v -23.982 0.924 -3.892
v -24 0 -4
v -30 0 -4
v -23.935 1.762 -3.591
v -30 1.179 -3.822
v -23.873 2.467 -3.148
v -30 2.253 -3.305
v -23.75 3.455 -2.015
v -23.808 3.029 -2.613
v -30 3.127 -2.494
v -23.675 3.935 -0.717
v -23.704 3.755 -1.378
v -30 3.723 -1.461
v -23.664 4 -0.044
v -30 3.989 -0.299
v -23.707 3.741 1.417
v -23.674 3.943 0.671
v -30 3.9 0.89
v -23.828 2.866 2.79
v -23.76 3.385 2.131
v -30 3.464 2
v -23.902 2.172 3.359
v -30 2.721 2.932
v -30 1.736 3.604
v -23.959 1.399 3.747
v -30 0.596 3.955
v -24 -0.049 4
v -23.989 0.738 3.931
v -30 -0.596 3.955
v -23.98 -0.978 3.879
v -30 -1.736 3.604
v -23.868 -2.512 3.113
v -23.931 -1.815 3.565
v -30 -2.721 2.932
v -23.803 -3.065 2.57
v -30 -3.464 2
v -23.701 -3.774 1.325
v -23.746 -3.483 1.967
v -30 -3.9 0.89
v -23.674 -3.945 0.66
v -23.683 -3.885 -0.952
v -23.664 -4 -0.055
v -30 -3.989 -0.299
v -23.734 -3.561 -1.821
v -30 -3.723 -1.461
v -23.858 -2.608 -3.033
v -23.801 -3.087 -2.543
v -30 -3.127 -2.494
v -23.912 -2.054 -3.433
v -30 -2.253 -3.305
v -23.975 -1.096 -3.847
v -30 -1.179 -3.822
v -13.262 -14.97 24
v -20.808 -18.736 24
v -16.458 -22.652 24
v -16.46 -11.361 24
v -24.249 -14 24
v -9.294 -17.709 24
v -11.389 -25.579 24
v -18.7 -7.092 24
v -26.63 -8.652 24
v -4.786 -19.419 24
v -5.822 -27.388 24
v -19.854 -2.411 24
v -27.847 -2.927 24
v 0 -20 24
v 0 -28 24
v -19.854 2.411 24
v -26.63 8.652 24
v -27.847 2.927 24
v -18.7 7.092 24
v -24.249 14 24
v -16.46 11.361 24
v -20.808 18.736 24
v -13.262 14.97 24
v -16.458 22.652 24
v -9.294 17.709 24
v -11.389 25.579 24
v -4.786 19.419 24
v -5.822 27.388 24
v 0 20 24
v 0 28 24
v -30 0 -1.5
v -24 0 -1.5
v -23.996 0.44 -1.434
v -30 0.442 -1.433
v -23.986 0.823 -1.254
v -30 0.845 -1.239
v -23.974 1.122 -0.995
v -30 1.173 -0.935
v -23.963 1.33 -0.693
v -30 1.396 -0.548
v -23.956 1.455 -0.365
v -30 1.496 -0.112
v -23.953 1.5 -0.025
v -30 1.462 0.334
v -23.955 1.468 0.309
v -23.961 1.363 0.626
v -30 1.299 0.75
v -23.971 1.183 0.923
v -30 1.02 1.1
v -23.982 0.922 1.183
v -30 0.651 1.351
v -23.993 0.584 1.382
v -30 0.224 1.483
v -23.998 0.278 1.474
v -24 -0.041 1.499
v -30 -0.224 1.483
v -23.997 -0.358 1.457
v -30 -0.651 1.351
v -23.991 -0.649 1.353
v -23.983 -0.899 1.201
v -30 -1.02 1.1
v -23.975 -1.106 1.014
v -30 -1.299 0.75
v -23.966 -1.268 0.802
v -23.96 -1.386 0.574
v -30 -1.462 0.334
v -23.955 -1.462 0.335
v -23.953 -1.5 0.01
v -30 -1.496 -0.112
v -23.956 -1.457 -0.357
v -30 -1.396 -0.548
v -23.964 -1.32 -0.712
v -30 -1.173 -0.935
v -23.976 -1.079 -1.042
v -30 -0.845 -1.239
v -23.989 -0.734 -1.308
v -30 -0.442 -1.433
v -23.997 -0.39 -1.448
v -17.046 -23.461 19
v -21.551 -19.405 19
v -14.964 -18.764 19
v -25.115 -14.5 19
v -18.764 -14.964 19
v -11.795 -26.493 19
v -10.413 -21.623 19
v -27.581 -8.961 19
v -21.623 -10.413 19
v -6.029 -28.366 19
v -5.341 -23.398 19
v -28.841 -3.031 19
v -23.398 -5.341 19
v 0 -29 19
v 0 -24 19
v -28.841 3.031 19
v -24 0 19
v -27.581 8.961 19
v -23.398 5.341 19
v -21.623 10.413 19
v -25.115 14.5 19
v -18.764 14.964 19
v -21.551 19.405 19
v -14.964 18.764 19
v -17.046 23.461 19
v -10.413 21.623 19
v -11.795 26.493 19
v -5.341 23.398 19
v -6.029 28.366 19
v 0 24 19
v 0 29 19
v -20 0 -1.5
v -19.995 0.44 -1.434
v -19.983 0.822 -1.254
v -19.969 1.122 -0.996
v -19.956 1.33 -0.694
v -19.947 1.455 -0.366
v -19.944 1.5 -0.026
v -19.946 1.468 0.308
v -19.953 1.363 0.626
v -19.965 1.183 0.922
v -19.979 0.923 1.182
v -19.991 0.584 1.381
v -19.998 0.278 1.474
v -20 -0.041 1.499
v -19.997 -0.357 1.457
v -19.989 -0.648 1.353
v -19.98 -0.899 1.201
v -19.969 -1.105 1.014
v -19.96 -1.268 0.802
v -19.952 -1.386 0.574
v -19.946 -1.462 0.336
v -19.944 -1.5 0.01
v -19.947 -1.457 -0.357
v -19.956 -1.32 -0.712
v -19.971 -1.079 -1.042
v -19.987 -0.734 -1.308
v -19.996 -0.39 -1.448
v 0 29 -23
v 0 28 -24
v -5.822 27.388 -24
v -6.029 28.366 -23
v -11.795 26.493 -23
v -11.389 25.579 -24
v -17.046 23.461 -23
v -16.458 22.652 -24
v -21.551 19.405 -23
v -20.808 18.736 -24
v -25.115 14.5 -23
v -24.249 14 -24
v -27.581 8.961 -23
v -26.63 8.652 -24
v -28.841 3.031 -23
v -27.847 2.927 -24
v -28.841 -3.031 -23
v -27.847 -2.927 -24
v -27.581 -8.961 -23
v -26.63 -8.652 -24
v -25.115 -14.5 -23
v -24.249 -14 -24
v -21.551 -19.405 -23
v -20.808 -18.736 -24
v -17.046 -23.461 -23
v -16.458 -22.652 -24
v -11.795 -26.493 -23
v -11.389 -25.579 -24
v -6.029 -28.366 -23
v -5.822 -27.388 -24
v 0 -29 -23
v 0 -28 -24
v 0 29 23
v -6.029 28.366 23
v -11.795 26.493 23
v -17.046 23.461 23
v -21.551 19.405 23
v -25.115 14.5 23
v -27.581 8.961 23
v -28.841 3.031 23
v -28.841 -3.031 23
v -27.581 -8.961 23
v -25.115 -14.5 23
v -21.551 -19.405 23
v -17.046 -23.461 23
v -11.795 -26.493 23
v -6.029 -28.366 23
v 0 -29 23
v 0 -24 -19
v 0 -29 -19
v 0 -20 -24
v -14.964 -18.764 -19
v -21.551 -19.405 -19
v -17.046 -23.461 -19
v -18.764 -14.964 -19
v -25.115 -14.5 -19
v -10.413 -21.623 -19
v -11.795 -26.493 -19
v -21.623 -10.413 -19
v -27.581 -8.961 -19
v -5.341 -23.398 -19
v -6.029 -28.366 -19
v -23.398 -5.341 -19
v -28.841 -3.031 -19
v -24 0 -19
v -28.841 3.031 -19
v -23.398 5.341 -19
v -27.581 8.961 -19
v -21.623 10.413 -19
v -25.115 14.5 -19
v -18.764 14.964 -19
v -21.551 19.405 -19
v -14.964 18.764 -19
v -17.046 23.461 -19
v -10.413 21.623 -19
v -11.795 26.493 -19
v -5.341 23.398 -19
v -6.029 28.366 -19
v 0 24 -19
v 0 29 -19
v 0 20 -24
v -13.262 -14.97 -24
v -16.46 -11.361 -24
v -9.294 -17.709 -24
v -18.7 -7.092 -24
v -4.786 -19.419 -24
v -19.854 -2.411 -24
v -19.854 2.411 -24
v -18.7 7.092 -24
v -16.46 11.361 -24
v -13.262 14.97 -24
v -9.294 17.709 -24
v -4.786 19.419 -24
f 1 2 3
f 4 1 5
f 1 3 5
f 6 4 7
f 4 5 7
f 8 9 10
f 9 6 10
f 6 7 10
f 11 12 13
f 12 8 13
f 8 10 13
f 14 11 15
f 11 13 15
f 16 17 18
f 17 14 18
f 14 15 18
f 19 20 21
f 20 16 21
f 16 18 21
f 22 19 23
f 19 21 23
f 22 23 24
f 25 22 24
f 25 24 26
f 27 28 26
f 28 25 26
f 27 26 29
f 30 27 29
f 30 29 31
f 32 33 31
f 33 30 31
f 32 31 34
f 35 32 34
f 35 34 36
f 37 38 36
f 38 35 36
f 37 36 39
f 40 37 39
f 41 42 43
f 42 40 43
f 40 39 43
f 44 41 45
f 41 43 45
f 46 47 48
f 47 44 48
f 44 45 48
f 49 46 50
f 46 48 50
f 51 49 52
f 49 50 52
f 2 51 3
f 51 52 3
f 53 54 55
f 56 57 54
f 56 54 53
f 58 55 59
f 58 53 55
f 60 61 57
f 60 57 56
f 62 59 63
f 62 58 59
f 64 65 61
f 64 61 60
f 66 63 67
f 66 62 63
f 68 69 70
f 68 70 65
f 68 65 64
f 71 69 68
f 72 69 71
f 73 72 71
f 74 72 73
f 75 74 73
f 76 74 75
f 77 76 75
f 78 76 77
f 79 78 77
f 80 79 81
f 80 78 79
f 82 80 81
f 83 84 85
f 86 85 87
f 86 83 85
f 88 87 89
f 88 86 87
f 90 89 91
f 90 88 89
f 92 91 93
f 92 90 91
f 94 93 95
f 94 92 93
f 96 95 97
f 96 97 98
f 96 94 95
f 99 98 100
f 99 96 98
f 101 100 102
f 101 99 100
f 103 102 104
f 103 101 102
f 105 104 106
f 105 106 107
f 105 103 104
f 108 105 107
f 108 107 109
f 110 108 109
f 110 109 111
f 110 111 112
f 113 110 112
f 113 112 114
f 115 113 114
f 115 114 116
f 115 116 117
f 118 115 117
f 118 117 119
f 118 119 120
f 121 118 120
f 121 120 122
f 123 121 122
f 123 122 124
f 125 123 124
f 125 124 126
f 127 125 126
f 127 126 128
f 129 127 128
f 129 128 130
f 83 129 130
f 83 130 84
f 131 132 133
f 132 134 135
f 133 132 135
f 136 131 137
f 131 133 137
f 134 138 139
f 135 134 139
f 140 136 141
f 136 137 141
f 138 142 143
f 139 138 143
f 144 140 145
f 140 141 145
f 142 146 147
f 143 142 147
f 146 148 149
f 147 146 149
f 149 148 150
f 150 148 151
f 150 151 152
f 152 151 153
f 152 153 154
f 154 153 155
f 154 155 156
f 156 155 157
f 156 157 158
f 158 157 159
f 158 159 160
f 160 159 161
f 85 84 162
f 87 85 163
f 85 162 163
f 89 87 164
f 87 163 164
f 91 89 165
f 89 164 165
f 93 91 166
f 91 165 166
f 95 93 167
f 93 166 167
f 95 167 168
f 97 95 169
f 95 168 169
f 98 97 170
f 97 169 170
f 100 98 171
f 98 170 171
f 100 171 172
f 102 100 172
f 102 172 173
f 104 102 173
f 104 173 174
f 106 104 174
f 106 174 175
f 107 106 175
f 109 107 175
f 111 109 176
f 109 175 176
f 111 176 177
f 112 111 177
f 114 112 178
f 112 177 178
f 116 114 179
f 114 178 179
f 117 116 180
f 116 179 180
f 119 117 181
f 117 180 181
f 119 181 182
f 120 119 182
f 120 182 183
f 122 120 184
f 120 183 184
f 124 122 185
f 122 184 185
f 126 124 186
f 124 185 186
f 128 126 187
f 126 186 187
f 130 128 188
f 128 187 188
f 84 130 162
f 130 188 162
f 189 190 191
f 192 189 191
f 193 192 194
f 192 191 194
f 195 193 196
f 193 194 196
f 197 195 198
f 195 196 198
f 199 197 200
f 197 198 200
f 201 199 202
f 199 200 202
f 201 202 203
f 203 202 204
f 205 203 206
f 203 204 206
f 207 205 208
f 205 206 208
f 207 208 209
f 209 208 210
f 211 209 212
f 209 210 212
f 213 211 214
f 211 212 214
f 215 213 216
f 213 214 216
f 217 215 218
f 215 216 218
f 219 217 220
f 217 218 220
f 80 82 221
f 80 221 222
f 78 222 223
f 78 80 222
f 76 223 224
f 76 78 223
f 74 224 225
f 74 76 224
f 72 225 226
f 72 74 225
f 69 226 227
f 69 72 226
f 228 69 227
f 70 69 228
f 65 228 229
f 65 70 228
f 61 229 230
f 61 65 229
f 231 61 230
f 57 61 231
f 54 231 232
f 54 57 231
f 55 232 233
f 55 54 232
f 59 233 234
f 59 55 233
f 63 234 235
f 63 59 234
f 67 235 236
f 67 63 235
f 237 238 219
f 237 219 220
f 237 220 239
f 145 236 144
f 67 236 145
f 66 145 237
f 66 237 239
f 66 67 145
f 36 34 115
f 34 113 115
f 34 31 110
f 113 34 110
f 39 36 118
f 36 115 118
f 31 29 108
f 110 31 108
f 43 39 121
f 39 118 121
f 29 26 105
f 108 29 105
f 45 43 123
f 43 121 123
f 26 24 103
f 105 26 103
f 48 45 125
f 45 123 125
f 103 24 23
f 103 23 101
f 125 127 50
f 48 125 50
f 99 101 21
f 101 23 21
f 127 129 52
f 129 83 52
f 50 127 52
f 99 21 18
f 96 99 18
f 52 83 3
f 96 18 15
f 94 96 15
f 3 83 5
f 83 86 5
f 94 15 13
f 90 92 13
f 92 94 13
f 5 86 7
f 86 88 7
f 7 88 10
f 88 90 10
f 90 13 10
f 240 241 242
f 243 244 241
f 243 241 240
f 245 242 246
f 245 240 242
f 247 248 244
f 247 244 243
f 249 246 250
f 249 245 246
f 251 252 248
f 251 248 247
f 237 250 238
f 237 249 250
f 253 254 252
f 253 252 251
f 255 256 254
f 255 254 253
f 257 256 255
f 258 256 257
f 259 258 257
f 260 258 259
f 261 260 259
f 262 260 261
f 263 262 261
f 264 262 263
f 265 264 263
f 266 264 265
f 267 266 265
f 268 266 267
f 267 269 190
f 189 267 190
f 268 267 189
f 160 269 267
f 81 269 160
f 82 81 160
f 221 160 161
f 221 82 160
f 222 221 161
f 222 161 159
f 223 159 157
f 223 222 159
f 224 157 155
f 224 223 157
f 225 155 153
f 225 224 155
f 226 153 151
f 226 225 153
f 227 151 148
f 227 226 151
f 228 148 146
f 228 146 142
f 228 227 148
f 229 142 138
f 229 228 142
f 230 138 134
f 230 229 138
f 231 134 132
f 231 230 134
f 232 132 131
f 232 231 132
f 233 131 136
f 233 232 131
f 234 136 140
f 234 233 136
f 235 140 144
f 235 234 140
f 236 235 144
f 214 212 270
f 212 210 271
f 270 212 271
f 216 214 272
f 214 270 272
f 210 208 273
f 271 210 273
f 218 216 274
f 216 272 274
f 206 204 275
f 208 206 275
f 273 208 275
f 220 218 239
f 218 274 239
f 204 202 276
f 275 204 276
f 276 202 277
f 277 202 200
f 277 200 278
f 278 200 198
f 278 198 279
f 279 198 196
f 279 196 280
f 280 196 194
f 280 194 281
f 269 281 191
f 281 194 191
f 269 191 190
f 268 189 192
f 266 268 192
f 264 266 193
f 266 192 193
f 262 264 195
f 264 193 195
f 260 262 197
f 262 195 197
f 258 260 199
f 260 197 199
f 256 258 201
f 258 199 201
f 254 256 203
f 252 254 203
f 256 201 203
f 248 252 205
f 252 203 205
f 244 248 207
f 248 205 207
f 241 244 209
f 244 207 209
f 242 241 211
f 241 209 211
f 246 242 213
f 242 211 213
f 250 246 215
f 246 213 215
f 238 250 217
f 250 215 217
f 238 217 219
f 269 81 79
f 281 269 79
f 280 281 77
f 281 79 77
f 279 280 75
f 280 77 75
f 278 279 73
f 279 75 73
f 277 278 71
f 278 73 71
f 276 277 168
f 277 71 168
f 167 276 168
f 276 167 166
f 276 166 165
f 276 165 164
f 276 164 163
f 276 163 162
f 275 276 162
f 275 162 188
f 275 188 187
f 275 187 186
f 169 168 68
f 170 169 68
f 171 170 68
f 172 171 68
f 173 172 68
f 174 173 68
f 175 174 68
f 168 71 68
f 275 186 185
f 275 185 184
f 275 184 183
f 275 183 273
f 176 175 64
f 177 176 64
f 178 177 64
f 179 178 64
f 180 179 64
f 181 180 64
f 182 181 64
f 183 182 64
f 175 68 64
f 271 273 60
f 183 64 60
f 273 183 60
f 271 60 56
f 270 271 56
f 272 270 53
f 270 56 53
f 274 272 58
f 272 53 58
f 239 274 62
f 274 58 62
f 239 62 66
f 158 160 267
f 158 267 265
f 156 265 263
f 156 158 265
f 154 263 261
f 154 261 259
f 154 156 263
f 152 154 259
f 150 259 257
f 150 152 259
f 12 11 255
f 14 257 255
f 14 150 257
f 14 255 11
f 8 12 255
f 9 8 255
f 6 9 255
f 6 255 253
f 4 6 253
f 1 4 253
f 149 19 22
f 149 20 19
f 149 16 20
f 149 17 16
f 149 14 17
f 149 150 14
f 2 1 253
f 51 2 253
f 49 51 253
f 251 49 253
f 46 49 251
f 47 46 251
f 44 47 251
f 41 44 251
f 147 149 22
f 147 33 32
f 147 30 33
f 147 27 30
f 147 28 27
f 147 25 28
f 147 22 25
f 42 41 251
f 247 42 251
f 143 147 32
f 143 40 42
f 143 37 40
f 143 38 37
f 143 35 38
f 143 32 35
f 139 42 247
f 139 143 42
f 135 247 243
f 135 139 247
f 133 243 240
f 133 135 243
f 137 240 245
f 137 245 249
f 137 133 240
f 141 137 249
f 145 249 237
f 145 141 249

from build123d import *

# Parameters (mm, degrees)
SKETCH_1_R           = 24
SKETCH_1_R_2         = 20
EXTRUDE_1_DEPTH      = 24
EXTRUDE_START        = -5
SKETCH_2_R           = 29
SKETCH_2_R_2         = 24
EXTRUDE_2_DEPTH      = 5
SKETCH_5_W           = 29
SKETCH_5_H           = 58
CUT_EXTRUDE_1_DEPTH  = 64.134776471
CHAMFER_2_SIZE       = 1
EXTRUDE_3_REACH      = 79.518
EXTRUDE_3_END_RADIUS = 24
EXTRUDE_START_2      = -30
SKETCH_6_R           = 4
SKETCH_6_R_2         = 1.5
SKETCH_6_2_R         = 1.5
CUT_EXTRUDE_2_DEPTH  = 49.135226249


with BuildPart() as part:
    # Эскиз1 → Бобышка-Вытянуть1 (new body)
    with BuildSketch(Plane.XY):
        Circle(SKETCH_1_R)
        Circle(SKETCH_1_R_2, mode=Mode.SUBTRACT)
    extrude(amount=EXTRUDE_1_DEPTH)

    # Эскиз2 → Бобышка-Вытянуть2 (add)
    with BuildSketch(Plane.XY.offset(24).offset(EXTRUDE_START)):
        Circle(SKETCH_2_R)
        Circle(SKETCH_2_R_2, mode=Mode.SUBTRACT)
    extrude(amount=EXTRUDE_2_DEPTH)

    # Зеркальное отражение1: part across plane


with BuildPart() as part_1:
    add(part.part)
    add(part.part.mirror(Plane.XY))

    # Эскиз5 → Вырез-Вытянуть1 (cut, through all)
    with BuildSketch(Plane.XY.offset(24)):
        with Locations((14.5, 0)):
            Rectangle(SKETCH_5_W, SKETCH_5_H)
    extrude(amount=-CUT_EXTRUDE_1_DEPTH, mode=Mode.SUBTRACT)

    # Фаска2
    chamfer_2_edges = [part_1.edges().sort_by_distance(p)[0] for p in [
        (-29, 0, -24),
        (-29, 0, 24),
    ]]
    chamfer(chamfer_2_edges, length=CHAMFER_2_SIZE)

    # Бобышка-Вытянуть3: up to this cylinder (the profile starts outside it)
    extrude_3_end = Plane(origin=(0, 0, 3.886863), z_dir=(0, 0, -1)) * Cylinder(EXTRUDE_3_END_RADIUS, 208.036, mode=Mode.PRIVATE)
    # Эскиз6 → Бобышка-Вытянуть3 (add, up to the surface)
    with BuildSketch(Plane(origin=(0, 0, 0), x_dir=(0, 0, -1), z_dir=(1, 0, 0)).offset(EXTRUDE_START_2), mode=Mode.PRIVATE) as extrude_3_sk1:
        Circle(SKETCH_6_R)
        Circle(SKETCH_6_R_2, mode=Mode.SUBTRACT)
    extrude_3_tool1 = extrude(extrude_3_sk1.sketch, amount=EXTRUDE_3_REACH, mode=Mode.PRIVATE) - extrude_3_end
    add(extrude_3_tool1.solids().sort_by_distance((-30, 0, 3.886863))[0])

    # Эскиз6<2> → Вырез-Вытянуть2 (cut, through all)
    with BuildSketch(Plane(origin=(0, 0, 0), x_dir=(0, 0, -1), z_dir=(1, 0, 0))):
        Circle(SKETCH_6_2_R)
    extrude(amount=-CUT_EXTRUDE_2_DEPTH, mode=Mode.SUBTRACT)


solid = part_1.part
